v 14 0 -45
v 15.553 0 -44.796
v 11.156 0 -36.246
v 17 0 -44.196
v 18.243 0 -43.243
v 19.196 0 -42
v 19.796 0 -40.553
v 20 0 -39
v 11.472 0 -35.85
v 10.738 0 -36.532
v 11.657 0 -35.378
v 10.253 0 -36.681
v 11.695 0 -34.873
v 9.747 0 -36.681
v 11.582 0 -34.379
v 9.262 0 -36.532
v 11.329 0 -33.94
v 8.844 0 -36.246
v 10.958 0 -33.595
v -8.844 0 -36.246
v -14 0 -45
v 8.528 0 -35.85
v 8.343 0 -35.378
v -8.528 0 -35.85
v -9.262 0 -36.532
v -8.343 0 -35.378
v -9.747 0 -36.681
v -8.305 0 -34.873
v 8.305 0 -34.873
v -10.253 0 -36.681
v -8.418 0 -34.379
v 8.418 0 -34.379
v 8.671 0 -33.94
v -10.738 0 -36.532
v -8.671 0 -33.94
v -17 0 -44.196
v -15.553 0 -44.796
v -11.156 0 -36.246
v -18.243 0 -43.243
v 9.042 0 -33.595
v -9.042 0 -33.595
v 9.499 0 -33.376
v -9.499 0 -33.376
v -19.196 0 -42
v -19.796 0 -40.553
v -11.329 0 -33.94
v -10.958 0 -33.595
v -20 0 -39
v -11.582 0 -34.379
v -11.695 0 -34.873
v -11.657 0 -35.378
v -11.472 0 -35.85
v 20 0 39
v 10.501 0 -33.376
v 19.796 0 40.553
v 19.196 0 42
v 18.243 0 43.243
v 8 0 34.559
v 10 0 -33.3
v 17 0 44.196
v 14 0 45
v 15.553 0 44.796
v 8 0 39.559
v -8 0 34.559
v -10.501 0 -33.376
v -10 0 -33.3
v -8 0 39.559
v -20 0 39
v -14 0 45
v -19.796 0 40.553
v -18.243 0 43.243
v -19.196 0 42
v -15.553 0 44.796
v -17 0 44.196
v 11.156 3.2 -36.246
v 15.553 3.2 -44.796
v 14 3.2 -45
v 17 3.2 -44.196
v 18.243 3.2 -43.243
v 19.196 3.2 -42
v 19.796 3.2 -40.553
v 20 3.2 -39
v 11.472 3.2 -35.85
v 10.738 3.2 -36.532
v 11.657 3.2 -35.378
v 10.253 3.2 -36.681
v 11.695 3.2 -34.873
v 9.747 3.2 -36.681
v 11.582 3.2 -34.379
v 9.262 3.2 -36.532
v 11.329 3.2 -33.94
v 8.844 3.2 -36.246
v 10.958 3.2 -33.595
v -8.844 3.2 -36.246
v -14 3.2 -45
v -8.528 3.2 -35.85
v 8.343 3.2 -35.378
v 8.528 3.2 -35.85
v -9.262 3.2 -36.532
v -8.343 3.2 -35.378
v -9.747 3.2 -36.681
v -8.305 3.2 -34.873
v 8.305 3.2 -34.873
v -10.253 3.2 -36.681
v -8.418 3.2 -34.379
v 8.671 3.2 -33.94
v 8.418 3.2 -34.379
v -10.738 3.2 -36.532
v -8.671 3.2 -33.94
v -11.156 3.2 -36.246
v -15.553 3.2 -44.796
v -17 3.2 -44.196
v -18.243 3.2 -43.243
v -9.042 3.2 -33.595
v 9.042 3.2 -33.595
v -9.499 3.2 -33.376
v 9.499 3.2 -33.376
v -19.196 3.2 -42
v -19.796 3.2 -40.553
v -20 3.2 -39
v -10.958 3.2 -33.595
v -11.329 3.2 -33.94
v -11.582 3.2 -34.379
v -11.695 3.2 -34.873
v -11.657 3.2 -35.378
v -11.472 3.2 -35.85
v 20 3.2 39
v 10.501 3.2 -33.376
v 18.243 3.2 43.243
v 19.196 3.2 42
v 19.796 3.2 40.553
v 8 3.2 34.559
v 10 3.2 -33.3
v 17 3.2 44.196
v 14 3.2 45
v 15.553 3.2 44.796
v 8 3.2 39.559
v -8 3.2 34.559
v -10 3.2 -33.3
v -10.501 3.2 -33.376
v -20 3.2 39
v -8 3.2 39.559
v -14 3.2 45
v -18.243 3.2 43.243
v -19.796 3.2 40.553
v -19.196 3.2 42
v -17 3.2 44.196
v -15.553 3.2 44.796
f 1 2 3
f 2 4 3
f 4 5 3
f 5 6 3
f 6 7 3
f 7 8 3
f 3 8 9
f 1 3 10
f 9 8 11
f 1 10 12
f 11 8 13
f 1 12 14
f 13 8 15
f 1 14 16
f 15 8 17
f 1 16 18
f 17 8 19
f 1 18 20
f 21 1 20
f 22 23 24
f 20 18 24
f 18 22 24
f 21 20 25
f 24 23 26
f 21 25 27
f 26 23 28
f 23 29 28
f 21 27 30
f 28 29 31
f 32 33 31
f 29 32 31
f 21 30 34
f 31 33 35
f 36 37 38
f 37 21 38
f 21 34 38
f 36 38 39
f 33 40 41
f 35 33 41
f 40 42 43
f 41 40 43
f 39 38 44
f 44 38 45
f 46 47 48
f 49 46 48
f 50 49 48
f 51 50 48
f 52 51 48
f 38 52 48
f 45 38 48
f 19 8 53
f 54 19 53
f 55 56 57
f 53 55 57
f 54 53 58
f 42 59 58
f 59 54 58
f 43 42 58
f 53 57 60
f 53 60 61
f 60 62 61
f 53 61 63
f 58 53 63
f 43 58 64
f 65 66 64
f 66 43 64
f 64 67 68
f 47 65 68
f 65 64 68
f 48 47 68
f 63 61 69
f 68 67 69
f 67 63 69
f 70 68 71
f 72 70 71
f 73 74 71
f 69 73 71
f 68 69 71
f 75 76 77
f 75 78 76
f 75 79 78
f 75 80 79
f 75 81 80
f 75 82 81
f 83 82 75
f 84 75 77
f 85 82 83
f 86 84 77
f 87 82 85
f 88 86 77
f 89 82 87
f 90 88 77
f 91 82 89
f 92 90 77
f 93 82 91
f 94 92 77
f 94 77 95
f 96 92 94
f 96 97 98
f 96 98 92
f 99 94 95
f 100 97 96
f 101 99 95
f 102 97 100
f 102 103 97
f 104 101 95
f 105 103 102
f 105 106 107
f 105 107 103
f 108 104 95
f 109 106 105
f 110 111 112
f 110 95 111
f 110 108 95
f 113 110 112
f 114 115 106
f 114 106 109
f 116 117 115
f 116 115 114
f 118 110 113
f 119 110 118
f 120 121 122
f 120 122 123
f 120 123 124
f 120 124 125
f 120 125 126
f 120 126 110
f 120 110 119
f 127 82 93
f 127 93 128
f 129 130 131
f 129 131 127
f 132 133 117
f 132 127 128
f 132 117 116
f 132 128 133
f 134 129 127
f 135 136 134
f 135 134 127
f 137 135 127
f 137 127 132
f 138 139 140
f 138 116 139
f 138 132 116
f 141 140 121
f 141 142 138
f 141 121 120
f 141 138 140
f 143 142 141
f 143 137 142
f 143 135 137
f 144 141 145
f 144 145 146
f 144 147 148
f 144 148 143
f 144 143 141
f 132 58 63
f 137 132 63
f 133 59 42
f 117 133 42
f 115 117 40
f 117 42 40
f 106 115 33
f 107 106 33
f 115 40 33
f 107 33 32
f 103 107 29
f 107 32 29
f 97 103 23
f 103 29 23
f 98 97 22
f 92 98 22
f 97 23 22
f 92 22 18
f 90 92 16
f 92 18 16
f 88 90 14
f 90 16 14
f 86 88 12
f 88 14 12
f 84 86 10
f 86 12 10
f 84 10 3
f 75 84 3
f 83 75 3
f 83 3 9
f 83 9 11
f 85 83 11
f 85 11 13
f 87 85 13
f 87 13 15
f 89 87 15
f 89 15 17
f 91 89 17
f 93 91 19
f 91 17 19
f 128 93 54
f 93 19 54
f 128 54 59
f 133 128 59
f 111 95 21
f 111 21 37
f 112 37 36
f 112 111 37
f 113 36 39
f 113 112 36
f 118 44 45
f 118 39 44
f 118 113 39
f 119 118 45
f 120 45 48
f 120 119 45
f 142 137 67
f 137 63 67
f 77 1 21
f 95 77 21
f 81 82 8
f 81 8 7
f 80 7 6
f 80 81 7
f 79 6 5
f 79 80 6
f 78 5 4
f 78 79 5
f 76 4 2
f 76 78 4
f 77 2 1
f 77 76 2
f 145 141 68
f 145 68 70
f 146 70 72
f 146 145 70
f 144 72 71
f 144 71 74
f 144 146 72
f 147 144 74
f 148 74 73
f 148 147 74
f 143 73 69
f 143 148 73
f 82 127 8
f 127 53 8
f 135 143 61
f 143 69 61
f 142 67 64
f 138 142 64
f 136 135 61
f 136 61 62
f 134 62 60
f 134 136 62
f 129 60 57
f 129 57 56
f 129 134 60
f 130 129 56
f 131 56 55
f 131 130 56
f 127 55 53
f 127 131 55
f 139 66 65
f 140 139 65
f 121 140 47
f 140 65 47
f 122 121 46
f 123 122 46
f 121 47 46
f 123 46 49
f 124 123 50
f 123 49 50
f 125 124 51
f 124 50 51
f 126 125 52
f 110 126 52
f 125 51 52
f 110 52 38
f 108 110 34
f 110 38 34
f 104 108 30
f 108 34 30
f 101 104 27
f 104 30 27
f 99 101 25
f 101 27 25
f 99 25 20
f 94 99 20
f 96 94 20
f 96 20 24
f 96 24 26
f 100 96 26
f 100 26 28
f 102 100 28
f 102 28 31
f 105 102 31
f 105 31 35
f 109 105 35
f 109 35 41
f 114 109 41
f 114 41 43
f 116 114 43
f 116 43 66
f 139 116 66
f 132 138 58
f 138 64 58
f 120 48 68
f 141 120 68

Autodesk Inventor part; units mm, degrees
ref_plane "YZ Plane" through (0, 0, 0) normal (1, 0, 0) x (0, 1, 0)
ref_plane "XZ Plane" through (0, 0, 0) normal (0, 1, 0) x (-1, 0, 0)
ref_plane "XY Plane" through (0, 0, 0) normal (0, 0, 1) x (1, 0, 0)
sketch "Sketch1" plane through (0, 0, 0) normal (0, 1, 0) x (-1, 0, 0)
  line L0 (20, 45) -> (-20, 45)
  line L1 (-20, 45) -> (-20, -45)
  line L2 (-20, -45) -> (20, -45)
  line L3 (20, -45) -> (20, 45)
  line L4 (20, 45) -> (-20, -45) construction
  line L5 (-20, 45) -> (20, -45) construction
  point P0 (0, 0)
  dimension "d0" = 40
  dimension "d1" = 90
extrude "Plate1" add sketch "Sketch1" along normal blind 3.2
sketch "Sketch2" plane through (0, 3.2, 0) normal (0, 1, 0) x (1, 0, 0)
  line L0 (-20, -45) -> (20, -45) projected
  line L1 (0, -45) -> (0, 35)
  line L2 (0, 35) -> (-10, 35)
  point P0 (0, 0)
  point P1 (10, 35)
  point P2 (10, 35)
  dimension "d3" = 80
  dimension "d4" = 10
hole "Hole1" at (-10, 3.2, -35) at (10, 3.2, -35) direction (0, -1, 0) diameter 3.4 depth 3.2 tip angle 118 clearance for "Countersunk Flat Head Screw ISO 2009/7046" size "M3" standard "ISO"
sketch "Sketch4" plane through (0, 0, 0) normal (0, -1, 0) x (1, 0, 0)
  line L0 (8, 39.559) -> (-8, 39.559)
  line L1 (-8, 39.559) -> (-8, 34.559)
  line L2 (-8, 34.559) -> (8, 34.559)
  line L3 (8, 34.559) -> (8, 39.559)
  line L4 (8, 39.559) -> (-8, 34.559) construction
  line L5 (-8, 39.559) -> (8, 34.559) construction
  line L6 (-20, 45) -> (20, 45) projected
  point P0 (0, 0)
  point P1 (0, 37.059)
  dimension "d12" = 16
  dimension "d13" = 5
  dimension "d17" = 7.941
extrude "Cut1" cut sketch "Sketch4" against normal blind 3.2
fillet "Corner Round1" radius 6 4 edges at (20, 1.6, 45) (-20, 1.6, 45) (20, 1.6, -45) (-20, 1.6, -45)
equation "\"d10\" = Thickness"
equation "\"d14\" = Thickness"
equation "\"d2\" = Thickness"
equation "\"BendReliefWidth\" = Thickness"
equation "\"BendReliefDepth\" = 0.5 * Thickness"
equation "\"CornerReliefSize\" = 4 * Thickness"
equation "\"MinimumRemnant\" = 2 * Thickness"
equation "\"TransitionRadius\" = BendRadius"
equation "\"JacobiRadiusSize\" = BendRadius"
equation "\"GapSize\" = Thickness"
equation "\"Thickness\" = 3.2"
equation "\"BendRadius\" = 1.516"
properties part number "SP40V1 Chapa Base"
